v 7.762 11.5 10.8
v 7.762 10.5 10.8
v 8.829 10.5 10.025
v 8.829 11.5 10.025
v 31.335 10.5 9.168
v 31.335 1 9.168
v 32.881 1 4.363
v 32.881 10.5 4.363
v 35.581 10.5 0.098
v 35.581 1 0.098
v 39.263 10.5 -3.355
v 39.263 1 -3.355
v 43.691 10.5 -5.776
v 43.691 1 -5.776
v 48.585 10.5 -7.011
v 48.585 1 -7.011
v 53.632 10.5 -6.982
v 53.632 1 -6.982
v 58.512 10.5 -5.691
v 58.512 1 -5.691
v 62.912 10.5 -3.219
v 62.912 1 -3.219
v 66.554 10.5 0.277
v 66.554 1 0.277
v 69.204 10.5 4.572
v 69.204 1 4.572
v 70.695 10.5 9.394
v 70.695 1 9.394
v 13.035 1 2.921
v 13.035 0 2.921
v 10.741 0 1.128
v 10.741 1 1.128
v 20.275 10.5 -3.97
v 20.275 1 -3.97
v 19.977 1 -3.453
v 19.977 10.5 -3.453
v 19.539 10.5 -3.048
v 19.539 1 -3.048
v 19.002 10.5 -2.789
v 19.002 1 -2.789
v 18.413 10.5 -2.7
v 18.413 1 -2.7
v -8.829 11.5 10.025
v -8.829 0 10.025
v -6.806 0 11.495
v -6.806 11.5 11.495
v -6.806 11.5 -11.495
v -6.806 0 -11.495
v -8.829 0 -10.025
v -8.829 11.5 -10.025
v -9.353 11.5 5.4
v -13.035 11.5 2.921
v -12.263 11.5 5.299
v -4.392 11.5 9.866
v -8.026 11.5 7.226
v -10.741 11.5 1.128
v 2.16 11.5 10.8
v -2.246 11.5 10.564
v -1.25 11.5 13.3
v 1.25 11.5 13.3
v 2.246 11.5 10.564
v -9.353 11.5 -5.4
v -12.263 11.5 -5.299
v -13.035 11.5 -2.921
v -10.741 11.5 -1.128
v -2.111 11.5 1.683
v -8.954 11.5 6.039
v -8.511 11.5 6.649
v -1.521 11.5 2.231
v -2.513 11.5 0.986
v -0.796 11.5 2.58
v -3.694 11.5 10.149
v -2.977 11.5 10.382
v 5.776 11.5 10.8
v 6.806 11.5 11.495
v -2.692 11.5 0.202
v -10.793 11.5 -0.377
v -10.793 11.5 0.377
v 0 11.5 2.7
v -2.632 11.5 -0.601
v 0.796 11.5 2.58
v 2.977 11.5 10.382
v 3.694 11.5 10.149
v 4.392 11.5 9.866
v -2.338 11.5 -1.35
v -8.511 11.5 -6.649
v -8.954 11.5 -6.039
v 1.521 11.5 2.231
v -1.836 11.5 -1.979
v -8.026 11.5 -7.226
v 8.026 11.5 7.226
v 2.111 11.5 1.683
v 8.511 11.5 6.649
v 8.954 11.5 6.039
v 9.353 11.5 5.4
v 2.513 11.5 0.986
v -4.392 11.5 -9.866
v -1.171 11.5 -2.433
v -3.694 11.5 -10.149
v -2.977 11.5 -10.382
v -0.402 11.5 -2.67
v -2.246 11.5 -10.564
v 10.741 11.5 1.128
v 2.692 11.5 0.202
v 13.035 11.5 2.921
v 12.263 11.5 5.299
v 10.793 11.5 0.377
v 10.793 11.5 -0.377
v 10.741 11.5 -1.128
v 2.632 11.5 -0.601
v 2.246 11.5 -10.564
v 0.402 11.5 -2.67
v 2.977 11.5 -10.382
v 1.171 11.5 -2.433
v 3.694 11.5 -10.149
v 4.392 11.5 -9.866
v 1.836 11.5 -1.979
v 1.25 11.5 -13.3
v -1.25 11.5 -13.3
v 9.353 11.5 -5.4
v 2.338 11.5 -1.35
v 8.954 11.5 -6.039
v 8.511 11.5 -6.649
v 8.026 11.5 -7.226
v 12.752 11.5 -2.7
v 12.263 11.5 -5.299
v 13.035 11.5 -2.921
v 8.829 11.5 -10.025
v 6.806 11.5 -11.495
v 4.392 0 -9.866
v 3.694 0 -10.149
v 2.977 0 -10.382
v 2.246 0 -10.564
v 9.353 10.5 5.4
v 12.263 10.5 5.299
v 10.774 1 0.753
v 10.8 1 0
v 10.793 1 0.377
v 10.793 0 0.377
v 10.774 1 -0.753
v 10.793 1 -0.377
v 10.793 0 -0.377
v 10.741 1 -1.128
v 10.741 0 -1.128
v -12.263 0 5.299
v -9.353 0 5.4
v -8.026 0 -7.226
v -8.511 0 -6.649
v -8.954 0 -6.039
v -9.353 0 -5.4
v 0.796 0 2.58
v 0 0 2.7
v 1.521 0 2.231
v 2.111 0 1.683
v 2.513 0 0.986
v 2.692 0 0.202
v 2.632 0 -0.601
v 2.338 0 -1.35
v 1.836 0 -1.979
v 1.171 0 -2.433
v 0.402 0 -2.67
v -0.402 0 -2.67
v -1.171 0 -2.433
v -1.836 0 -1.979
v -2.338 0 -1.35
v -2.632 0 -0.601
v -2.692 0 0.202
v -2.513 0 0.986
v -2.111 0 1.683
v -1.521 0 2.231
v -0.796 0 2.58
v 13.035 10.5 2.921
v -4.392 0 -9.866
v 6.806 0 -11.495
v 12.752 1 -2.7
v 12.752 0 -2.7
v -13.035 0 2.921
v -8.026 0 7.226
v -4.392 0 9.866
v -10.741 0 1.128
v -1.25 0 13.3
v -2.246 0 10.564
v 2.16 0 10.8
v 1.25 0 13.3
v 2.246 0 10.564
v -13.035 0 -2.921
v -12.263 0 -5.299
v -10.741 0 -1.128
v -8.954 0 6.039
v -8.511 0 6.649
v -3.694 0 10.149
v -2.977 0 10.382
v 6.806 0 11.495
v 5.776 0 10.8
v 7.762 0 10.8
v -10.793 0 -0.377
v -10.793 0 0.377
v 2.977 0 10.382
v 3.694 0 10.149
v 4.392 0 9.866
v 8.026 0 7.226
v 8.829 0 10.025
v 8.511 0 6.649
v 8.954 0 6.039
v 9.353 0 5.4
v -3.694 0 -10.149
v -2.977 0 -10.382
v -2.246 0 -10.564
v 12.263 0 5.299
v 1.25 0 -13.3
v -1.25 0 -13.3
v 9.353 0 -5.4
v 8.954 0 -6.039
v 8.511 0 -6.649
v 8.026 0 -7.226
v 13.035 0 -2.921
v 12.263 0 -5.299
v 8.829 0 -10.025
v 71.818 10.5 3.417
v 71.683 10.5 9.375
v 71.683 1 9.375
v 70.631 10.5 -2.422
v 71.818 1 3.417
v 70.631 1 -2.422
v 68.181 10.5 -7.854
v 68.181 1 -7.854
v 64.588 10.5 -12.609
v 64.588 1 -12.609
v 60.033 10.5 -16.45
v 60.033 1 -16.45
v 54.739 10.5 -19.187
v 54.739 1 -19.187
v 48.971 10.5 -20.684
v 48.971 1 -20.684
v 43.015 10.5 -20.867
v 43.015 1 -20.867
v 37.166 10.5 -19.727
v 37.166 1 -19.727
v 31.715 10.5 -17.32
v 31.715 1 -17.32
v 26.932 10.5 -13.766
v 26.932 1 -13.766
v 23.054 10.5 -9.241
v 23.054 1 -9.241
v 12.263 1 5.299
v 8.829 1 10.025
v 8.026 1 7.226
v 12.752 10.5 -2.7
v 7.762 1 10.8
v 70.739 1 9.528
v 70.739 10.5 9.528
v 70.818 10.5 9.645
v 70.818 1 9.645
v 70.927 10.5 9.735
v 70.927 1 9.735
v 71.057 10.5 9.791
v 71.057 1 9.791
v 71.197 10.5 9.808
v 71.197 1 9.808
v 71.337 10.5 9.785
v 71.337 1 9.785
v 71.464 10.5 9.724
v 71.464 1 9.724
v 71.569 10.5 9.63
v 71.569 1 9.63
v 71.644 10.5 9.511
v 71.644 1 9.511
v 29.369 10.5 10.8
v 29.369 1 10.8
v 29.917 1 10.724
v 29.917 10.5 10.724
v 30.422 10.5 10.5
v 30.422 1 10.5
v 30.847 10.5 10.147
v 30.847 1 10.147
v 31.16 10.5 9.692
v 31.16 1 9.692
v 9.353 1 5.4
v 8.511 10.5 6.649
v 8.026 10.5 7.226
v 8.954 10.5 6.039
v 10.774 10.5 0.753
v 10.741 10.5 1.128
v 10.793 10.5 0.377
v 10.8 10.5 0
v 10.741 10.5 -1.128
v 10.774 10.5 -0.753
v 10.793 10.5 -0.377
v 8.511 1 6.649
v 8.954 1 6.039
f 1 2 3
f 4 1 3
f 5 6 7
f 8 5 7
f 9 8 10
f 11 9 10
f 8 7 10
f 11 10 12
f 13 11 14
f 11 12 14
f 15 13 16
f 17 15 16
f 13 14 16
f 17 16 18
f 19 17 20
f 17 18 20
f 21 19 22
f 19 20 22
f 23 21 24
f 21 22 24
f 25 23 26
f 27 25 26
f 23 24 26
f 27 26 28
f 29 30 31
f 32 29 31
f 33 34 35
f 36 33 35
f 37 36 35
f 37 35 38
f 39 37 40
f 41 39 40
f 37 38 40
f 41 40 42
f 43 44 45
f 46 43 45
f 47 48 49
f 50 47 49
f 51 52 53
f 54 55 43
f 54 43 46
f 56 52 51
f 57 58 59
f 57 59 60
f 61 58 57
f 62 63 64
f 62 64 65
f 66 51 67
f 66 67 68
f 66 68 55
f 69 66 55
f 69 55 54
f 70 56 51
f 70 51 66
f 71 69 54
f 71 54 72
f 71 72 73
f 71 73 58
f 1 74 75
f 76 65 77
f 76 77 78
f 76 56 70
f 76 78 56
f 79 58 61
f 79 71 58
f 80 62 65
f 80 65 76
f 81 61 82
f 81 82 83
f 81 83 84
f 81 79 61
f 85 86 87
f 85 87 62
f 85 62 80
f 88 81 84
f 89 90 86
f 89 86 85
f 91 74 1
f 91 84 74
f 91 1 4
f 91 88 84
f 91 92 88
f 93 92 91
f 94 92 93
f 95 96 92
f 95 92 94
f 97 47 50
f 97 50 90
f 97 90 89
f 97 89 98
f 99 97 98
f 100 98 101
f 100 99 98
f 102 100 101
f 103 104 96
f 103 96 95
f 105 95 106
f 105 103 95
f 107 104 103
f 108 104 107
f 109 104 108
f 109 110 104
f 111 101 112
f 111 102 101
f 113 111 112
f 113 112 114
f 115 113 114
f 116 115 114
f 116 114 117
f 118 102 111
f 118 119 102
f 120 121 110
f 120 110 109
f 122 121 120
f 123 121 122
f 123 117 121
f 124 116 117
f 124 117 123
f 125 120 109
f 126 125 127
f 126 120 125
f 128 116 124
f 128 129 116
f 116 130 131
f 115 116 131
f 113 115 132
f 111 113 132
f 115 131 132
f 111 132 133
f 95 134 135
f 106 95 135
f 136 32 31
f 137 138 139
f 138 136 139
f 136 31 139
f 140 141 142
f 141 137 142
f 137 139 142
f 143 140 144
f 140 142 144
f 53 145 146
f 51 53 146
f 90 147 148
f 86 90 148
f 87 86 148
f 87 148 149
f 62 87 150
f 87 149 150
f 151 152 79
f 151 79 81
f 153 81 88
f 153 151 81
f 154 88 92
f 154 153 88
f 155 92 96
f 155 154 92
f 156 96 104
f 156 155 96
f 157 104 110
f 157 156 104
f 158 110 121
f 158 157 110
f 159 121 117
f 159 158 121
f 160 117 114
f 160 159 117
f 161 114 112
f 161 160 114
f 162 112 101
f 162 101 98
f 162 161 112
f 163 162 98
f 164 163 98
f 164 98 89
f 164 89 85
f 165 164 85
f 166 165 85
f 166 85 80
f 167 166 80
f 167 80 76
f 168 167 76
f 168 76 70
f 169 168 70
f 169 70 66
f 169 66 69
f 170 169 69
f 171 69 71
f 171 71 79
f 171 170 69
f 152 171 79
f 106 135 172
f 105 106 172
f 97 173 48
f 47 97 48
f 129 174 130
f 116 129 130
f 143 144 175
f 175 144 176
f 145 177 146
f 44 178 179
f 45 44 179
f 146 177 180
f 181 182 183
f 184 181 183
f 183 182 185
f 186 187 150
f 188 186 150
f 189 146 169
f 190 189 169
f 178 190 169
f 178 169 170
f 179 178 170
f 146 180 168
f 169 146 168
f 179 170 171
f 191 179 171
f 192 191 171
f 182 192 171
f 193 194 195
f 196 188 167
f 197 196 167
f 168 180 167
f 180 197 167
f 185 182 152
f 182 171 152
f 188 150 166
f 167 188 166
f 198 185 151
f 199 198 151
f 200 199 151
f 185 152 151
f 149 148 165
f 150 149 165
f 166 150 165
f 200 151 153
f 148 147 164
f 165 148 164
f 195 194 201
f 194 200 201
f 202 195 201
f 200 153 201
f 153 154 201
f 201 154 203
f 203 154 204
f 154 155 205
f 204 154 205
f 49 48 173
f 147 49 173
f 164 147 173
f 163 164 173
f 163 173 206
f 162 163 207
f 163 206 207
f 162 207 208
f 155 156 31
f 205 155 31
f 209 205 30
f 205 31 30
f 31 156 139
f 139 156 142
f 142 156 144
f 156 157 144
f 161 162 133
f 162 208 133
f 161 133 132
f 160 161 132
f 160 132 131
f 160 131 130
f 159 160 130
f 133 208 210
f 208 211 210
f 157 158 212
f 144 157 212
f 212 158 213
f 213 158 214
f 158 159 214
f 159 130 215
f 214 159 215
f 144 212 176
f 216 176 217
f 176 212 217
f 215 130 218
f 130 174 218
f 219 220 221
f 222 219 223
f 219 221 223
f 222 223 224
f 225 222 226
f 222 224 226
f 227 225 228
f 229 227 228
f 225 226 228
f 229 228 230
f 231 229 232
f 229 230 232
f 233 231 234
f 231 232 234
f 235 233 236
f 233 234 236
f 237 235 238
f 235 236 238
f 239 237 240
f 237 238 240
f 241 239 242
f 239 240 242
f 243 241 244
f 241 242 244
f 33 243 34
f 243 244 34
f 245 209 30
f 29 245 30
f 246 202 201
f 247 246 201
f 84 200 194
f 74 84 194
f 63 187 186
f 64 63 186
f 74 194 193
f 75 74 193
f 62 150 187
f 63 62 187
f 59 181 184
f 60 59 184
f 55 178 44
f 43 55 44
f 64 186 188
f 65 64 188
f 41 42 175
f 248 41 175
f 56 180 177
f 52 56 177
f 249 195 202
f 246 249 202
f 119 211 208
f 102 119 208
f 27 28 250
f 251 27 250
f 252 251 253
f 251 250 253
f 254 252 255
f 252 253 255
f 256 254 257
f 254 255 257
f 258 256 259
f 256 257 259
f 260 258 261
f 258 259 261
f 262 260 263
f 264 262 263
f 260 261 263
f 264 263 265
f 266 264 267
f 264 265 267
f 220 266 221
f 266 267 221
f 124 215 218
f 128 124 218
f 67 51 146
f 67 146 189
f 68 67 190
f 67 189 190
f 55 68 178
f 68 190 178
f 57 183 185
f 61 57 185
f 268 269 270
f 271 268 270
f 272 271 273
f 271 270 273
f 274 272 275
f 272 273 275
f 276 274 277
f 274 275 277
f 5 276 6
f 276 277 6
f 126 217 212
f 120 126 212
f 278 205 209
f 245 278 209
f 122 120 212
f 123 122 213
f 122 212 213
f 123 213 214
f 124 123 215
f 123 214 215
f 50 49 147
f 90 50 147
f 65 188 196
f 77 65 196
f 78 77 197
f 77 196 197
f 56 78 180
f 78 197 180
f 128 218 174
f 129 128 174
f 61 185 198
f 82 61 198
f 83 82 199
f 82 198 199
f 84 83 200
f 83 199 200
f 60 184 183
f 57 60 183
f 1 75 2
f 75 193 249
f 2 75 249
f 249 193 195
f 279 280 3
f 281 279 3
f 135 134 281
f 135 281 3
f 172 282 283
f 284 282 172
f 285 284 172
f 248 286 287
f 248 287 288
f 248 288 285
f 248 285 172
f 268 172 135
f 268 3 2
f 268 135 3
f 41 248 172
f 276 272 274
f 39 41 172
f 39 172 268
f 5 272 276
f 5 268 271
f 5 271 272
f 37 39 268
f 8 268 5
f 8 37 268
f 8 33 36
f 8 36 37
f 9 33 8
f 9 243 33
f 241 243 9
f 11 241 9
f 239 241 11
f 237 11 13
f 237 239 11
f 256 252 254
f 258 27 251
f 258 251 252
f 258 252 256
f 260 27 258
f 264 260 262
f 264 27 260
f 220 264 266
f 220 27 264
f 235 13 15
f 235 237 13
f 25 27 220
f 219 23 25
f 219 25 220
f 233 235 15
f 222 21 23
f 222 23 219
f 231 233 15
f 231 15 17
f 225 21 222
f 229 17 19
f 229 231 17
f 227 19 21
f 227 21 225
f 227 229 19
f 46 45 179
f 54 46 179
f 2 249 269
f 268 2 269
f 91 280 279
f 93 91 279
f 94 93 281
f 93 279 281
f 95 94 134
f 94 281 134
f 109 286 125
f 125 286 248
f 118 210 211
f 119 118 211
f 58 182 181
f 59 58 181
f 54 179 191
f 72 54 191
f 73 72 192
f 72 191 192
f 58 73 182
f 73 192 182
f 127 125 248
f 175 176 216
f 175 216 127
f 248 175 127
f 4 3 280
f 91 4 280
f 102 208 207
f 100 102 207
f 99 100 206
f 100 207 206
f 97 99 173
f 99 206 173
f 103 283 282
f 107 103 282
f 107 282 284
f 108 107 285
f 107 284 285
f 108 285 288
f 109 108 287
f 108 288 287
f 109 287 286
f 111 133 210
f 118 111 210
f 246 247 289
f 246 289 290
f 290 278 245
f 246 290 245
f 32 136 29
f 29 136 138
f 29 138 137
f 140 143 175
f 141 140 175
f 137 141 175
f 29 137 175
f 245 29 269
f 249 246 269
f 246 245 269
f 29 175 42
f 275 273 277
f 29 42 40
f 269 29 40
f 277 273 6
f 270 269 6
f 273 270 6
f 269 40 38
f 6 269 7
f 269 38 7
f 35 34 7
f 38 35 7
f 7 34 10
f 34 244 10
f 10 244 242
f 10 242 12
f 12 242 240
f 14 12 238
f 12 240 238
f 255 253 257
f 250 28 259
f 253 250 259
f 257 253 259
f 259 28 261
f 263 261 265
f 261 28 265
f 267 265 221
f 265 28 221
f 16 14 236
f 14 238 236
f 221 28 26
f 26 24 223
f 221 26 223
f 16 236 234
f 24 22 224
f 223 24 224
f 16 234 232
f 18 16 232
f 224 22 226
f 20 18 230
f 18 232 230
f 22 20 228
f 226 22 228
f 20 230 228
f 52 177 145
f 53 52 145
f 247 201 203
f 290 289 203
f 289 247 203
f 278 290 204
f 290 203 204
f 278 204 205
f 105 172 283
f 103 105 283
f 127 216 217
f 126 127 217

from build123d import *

# Parameters (mm, degrees)
SKETCH1_R           = 2.7
BOSS_EXTRUDE1_DEPTH = 11.5
BOSS_EXTRUDE3_START = 1
BOSS_EXTRUDE3_DEPTH = 9.5


with BuildPart() as part:
    # Sketch1 → Boss-Extrude1 (new body)
    with BuildSketch(Plane(origin=(0, 0, 0), x_dir=(1, 0, 0), z_dir=(0, 1, 0))):
        with BuildLine():
            Line((1.25, 13.3), (-1.25, 13.3))
            Line((-1.25, 13.3), (-2.24585645, 10.563906891))
            ThreePointArc((-2.24585645, 10.563906891), (-3.337383539, 10.271410376), (-4.392372642, 9.866461502))
            Line((-4.392372642, 9.866461502), (-6.806272613, 11.494657591))
            Line((-6.806272613, 11.494657591), (-8.828815098, 10.02519446))
            Line((-8.828815098, 10.02519446), (-8.026244712, 7.226298902))
            ThreePointArc((-8.026244712, 7.226298902), (-8.737383539, 6.348080725), (-9.352864677, 5.400363168))
            Line((-9.352864677, 5.400363168), (-12.262780424, 5.298746671))
            Line((-12.262780424, 5.298746671), (-13.03532291, 2.92110538))
            Line((-13.03532291, 2.92110538), (-10.740880296, 1.128490345))
            ThreePointArc((-10.740880296, 1.128490345), (-10.8, 0), (-10.740880296, -1.128490345))
            Line((-10.740880296, -1.128490345), (-13.03532291, -2.92110538))
            Line((-13.03532291, -2.92110538), (-12.262780424, -5.298746671))
            Line((-12.262780424, -5.298746671), (-9.352864677, -5.400363168))
            ThreePointArc((-9.352864677, -5.400363168), (-8.737383539, -6.348080725), (-8.026244712, -7.226298902))
            Line((-8.026244712, -7.226298902), (-8.828815098, -10.02519446))
            Line((-8.828815098, -10.02519446), (-6.806272613, -11.494657591))
            Line((-6.806272613, -11.494657591), (-4.392372642, -9.866461502))
            ThreePointArc((-4.392372642, -9.866461502), (-3.337383539, -10.271410376), (-2.24585645, -10.563906891))
            Line((-2.24585645, -10.563906891), (-1.25, -13.3))
            Line((-1.25, -13.3), (1.25, -13.3))
            Line((1.25, -13.3), (2.24585645, -10.563906891))
            ThreePointArc((2.24585645, -10.563906891), (3.337383539, -10.271410376), (4.392372642, -9.866461502))
            Line((4.392372642, -9.866461502), (6.806272613, -11.494657591))
            Line((6.806272613, -11.494657591), (8.828815098, -10.02519446))
            Line((8.828815098, -10.02519446), (8.026244712, -7.226298902))
            ThreePointArc((8.026244712, -7.226298902), (8.737383539, -6.348080725), (9.352864677, -5.400363168))
            Line((9.352864677, -5.400363168), (12.262780424, -5.298746671))
            Line((12.262780424, -5.298746671), (13.03532291, -2.92110538))
            Line((13.03532291, -2.92110538), (10.740880296, -1.128490345))
            ThreePointArc((10.740880296, -1.128490345), (10.8, 0), (10.740880296, 1.128490345))
            Line((10.740880296, 1.128490345), (13.03532291, 2.92110538))
            Line((13.03532291, 2.92110538), (12.262780424, 5.298746671))
            Line((12.262780424, 5.298746671), (9.352864677, 5.400363168))
            ThreePointArc((9.352864677, 5.400363168), (8.737383539, 6.348080725), (8.026244712, 7.226298902))
            Line((8.026244712, 7.226298902), (8.828815098, 10.02519446))
            Line((8.828815098, 10.02519446), (6.806272613, 11.494657591))
            Line((6.806272613, 11.494657591), (4.392372642, 9.866461502))
            ThreePointArc((4.392372642, 9.866461502), (3.337383539, 10.271410376), (2.24585645, 10.563906891))
            Line((2.24585645, 10.563906891), (1.25, 13.3))
        make_face()
        Circle(SKETCH1_R, mode=Mode.SUBTRACT)
    extrude(amount=BOSS_EXTRUDE1_DEPTH)

    # Sketch1<4> → Boss-Extrude3 (add)
    with BuildSketch(Plane(origin=(0, 0, 0), x_dir=(1, 0, 0), z_dir=(0, 1, 0)).offset(BOSS_EXTRUDE3_START)):
        with BuildLine():
            ThreePointArc((10.457055035, 2.7), (10.770443359, 0.798467184), (10.740880296, -1.128490345))
            Line((10.740880296, -1.128490345), (13.03532291, -2.92110538))
            Line((13.03532291, -2.92110538), (12.262780424, -5.298746671))
            Line((12.262780424, -5.298746671), (9.352864677, -5.400363168))
            ThreePointArc((9.352864677, -5.400363168), (8.737383539, -6.348080725), (8.026244712, -7.226298902))
            Line((8.026244712, -7.226298902), (8.828815098, -10.02519446))
            Line((8.828815098, -10.02519446), (7.762386761, -10.8))
            Line((7.762386761, -10.8), (29.369189077, -10.8))
            ThreePointArc((29.369189077, -10.8), (30.646867306, -10.338680715), (31.335127928, -9.167538342))
            ThreePointArc((31.335127928, -9.167538342), (51.109657071, 7.156746799), (70.69491969, -9.394137658))
            ThreePointArc((70.69491969, -9.394137658), (71.19716993, -9.807823175), (71.682924587, -9.374887357))
            ThreePointArc((71.682924587, -9.374887357), (51.897130707, 20.096844573), (20.274570163, 3.970025697))
            ThreePointArc((20.274570163, 3.970025697), (19.539499219, 3.047736612), (18.412545051, 2.7))
            Line((18.412545051, 2.7), (10.457055035, 2.7))
        make_face()
    extrude(amount=BOSS_EXTRUDE3_DEPTH)


solid = part.part
